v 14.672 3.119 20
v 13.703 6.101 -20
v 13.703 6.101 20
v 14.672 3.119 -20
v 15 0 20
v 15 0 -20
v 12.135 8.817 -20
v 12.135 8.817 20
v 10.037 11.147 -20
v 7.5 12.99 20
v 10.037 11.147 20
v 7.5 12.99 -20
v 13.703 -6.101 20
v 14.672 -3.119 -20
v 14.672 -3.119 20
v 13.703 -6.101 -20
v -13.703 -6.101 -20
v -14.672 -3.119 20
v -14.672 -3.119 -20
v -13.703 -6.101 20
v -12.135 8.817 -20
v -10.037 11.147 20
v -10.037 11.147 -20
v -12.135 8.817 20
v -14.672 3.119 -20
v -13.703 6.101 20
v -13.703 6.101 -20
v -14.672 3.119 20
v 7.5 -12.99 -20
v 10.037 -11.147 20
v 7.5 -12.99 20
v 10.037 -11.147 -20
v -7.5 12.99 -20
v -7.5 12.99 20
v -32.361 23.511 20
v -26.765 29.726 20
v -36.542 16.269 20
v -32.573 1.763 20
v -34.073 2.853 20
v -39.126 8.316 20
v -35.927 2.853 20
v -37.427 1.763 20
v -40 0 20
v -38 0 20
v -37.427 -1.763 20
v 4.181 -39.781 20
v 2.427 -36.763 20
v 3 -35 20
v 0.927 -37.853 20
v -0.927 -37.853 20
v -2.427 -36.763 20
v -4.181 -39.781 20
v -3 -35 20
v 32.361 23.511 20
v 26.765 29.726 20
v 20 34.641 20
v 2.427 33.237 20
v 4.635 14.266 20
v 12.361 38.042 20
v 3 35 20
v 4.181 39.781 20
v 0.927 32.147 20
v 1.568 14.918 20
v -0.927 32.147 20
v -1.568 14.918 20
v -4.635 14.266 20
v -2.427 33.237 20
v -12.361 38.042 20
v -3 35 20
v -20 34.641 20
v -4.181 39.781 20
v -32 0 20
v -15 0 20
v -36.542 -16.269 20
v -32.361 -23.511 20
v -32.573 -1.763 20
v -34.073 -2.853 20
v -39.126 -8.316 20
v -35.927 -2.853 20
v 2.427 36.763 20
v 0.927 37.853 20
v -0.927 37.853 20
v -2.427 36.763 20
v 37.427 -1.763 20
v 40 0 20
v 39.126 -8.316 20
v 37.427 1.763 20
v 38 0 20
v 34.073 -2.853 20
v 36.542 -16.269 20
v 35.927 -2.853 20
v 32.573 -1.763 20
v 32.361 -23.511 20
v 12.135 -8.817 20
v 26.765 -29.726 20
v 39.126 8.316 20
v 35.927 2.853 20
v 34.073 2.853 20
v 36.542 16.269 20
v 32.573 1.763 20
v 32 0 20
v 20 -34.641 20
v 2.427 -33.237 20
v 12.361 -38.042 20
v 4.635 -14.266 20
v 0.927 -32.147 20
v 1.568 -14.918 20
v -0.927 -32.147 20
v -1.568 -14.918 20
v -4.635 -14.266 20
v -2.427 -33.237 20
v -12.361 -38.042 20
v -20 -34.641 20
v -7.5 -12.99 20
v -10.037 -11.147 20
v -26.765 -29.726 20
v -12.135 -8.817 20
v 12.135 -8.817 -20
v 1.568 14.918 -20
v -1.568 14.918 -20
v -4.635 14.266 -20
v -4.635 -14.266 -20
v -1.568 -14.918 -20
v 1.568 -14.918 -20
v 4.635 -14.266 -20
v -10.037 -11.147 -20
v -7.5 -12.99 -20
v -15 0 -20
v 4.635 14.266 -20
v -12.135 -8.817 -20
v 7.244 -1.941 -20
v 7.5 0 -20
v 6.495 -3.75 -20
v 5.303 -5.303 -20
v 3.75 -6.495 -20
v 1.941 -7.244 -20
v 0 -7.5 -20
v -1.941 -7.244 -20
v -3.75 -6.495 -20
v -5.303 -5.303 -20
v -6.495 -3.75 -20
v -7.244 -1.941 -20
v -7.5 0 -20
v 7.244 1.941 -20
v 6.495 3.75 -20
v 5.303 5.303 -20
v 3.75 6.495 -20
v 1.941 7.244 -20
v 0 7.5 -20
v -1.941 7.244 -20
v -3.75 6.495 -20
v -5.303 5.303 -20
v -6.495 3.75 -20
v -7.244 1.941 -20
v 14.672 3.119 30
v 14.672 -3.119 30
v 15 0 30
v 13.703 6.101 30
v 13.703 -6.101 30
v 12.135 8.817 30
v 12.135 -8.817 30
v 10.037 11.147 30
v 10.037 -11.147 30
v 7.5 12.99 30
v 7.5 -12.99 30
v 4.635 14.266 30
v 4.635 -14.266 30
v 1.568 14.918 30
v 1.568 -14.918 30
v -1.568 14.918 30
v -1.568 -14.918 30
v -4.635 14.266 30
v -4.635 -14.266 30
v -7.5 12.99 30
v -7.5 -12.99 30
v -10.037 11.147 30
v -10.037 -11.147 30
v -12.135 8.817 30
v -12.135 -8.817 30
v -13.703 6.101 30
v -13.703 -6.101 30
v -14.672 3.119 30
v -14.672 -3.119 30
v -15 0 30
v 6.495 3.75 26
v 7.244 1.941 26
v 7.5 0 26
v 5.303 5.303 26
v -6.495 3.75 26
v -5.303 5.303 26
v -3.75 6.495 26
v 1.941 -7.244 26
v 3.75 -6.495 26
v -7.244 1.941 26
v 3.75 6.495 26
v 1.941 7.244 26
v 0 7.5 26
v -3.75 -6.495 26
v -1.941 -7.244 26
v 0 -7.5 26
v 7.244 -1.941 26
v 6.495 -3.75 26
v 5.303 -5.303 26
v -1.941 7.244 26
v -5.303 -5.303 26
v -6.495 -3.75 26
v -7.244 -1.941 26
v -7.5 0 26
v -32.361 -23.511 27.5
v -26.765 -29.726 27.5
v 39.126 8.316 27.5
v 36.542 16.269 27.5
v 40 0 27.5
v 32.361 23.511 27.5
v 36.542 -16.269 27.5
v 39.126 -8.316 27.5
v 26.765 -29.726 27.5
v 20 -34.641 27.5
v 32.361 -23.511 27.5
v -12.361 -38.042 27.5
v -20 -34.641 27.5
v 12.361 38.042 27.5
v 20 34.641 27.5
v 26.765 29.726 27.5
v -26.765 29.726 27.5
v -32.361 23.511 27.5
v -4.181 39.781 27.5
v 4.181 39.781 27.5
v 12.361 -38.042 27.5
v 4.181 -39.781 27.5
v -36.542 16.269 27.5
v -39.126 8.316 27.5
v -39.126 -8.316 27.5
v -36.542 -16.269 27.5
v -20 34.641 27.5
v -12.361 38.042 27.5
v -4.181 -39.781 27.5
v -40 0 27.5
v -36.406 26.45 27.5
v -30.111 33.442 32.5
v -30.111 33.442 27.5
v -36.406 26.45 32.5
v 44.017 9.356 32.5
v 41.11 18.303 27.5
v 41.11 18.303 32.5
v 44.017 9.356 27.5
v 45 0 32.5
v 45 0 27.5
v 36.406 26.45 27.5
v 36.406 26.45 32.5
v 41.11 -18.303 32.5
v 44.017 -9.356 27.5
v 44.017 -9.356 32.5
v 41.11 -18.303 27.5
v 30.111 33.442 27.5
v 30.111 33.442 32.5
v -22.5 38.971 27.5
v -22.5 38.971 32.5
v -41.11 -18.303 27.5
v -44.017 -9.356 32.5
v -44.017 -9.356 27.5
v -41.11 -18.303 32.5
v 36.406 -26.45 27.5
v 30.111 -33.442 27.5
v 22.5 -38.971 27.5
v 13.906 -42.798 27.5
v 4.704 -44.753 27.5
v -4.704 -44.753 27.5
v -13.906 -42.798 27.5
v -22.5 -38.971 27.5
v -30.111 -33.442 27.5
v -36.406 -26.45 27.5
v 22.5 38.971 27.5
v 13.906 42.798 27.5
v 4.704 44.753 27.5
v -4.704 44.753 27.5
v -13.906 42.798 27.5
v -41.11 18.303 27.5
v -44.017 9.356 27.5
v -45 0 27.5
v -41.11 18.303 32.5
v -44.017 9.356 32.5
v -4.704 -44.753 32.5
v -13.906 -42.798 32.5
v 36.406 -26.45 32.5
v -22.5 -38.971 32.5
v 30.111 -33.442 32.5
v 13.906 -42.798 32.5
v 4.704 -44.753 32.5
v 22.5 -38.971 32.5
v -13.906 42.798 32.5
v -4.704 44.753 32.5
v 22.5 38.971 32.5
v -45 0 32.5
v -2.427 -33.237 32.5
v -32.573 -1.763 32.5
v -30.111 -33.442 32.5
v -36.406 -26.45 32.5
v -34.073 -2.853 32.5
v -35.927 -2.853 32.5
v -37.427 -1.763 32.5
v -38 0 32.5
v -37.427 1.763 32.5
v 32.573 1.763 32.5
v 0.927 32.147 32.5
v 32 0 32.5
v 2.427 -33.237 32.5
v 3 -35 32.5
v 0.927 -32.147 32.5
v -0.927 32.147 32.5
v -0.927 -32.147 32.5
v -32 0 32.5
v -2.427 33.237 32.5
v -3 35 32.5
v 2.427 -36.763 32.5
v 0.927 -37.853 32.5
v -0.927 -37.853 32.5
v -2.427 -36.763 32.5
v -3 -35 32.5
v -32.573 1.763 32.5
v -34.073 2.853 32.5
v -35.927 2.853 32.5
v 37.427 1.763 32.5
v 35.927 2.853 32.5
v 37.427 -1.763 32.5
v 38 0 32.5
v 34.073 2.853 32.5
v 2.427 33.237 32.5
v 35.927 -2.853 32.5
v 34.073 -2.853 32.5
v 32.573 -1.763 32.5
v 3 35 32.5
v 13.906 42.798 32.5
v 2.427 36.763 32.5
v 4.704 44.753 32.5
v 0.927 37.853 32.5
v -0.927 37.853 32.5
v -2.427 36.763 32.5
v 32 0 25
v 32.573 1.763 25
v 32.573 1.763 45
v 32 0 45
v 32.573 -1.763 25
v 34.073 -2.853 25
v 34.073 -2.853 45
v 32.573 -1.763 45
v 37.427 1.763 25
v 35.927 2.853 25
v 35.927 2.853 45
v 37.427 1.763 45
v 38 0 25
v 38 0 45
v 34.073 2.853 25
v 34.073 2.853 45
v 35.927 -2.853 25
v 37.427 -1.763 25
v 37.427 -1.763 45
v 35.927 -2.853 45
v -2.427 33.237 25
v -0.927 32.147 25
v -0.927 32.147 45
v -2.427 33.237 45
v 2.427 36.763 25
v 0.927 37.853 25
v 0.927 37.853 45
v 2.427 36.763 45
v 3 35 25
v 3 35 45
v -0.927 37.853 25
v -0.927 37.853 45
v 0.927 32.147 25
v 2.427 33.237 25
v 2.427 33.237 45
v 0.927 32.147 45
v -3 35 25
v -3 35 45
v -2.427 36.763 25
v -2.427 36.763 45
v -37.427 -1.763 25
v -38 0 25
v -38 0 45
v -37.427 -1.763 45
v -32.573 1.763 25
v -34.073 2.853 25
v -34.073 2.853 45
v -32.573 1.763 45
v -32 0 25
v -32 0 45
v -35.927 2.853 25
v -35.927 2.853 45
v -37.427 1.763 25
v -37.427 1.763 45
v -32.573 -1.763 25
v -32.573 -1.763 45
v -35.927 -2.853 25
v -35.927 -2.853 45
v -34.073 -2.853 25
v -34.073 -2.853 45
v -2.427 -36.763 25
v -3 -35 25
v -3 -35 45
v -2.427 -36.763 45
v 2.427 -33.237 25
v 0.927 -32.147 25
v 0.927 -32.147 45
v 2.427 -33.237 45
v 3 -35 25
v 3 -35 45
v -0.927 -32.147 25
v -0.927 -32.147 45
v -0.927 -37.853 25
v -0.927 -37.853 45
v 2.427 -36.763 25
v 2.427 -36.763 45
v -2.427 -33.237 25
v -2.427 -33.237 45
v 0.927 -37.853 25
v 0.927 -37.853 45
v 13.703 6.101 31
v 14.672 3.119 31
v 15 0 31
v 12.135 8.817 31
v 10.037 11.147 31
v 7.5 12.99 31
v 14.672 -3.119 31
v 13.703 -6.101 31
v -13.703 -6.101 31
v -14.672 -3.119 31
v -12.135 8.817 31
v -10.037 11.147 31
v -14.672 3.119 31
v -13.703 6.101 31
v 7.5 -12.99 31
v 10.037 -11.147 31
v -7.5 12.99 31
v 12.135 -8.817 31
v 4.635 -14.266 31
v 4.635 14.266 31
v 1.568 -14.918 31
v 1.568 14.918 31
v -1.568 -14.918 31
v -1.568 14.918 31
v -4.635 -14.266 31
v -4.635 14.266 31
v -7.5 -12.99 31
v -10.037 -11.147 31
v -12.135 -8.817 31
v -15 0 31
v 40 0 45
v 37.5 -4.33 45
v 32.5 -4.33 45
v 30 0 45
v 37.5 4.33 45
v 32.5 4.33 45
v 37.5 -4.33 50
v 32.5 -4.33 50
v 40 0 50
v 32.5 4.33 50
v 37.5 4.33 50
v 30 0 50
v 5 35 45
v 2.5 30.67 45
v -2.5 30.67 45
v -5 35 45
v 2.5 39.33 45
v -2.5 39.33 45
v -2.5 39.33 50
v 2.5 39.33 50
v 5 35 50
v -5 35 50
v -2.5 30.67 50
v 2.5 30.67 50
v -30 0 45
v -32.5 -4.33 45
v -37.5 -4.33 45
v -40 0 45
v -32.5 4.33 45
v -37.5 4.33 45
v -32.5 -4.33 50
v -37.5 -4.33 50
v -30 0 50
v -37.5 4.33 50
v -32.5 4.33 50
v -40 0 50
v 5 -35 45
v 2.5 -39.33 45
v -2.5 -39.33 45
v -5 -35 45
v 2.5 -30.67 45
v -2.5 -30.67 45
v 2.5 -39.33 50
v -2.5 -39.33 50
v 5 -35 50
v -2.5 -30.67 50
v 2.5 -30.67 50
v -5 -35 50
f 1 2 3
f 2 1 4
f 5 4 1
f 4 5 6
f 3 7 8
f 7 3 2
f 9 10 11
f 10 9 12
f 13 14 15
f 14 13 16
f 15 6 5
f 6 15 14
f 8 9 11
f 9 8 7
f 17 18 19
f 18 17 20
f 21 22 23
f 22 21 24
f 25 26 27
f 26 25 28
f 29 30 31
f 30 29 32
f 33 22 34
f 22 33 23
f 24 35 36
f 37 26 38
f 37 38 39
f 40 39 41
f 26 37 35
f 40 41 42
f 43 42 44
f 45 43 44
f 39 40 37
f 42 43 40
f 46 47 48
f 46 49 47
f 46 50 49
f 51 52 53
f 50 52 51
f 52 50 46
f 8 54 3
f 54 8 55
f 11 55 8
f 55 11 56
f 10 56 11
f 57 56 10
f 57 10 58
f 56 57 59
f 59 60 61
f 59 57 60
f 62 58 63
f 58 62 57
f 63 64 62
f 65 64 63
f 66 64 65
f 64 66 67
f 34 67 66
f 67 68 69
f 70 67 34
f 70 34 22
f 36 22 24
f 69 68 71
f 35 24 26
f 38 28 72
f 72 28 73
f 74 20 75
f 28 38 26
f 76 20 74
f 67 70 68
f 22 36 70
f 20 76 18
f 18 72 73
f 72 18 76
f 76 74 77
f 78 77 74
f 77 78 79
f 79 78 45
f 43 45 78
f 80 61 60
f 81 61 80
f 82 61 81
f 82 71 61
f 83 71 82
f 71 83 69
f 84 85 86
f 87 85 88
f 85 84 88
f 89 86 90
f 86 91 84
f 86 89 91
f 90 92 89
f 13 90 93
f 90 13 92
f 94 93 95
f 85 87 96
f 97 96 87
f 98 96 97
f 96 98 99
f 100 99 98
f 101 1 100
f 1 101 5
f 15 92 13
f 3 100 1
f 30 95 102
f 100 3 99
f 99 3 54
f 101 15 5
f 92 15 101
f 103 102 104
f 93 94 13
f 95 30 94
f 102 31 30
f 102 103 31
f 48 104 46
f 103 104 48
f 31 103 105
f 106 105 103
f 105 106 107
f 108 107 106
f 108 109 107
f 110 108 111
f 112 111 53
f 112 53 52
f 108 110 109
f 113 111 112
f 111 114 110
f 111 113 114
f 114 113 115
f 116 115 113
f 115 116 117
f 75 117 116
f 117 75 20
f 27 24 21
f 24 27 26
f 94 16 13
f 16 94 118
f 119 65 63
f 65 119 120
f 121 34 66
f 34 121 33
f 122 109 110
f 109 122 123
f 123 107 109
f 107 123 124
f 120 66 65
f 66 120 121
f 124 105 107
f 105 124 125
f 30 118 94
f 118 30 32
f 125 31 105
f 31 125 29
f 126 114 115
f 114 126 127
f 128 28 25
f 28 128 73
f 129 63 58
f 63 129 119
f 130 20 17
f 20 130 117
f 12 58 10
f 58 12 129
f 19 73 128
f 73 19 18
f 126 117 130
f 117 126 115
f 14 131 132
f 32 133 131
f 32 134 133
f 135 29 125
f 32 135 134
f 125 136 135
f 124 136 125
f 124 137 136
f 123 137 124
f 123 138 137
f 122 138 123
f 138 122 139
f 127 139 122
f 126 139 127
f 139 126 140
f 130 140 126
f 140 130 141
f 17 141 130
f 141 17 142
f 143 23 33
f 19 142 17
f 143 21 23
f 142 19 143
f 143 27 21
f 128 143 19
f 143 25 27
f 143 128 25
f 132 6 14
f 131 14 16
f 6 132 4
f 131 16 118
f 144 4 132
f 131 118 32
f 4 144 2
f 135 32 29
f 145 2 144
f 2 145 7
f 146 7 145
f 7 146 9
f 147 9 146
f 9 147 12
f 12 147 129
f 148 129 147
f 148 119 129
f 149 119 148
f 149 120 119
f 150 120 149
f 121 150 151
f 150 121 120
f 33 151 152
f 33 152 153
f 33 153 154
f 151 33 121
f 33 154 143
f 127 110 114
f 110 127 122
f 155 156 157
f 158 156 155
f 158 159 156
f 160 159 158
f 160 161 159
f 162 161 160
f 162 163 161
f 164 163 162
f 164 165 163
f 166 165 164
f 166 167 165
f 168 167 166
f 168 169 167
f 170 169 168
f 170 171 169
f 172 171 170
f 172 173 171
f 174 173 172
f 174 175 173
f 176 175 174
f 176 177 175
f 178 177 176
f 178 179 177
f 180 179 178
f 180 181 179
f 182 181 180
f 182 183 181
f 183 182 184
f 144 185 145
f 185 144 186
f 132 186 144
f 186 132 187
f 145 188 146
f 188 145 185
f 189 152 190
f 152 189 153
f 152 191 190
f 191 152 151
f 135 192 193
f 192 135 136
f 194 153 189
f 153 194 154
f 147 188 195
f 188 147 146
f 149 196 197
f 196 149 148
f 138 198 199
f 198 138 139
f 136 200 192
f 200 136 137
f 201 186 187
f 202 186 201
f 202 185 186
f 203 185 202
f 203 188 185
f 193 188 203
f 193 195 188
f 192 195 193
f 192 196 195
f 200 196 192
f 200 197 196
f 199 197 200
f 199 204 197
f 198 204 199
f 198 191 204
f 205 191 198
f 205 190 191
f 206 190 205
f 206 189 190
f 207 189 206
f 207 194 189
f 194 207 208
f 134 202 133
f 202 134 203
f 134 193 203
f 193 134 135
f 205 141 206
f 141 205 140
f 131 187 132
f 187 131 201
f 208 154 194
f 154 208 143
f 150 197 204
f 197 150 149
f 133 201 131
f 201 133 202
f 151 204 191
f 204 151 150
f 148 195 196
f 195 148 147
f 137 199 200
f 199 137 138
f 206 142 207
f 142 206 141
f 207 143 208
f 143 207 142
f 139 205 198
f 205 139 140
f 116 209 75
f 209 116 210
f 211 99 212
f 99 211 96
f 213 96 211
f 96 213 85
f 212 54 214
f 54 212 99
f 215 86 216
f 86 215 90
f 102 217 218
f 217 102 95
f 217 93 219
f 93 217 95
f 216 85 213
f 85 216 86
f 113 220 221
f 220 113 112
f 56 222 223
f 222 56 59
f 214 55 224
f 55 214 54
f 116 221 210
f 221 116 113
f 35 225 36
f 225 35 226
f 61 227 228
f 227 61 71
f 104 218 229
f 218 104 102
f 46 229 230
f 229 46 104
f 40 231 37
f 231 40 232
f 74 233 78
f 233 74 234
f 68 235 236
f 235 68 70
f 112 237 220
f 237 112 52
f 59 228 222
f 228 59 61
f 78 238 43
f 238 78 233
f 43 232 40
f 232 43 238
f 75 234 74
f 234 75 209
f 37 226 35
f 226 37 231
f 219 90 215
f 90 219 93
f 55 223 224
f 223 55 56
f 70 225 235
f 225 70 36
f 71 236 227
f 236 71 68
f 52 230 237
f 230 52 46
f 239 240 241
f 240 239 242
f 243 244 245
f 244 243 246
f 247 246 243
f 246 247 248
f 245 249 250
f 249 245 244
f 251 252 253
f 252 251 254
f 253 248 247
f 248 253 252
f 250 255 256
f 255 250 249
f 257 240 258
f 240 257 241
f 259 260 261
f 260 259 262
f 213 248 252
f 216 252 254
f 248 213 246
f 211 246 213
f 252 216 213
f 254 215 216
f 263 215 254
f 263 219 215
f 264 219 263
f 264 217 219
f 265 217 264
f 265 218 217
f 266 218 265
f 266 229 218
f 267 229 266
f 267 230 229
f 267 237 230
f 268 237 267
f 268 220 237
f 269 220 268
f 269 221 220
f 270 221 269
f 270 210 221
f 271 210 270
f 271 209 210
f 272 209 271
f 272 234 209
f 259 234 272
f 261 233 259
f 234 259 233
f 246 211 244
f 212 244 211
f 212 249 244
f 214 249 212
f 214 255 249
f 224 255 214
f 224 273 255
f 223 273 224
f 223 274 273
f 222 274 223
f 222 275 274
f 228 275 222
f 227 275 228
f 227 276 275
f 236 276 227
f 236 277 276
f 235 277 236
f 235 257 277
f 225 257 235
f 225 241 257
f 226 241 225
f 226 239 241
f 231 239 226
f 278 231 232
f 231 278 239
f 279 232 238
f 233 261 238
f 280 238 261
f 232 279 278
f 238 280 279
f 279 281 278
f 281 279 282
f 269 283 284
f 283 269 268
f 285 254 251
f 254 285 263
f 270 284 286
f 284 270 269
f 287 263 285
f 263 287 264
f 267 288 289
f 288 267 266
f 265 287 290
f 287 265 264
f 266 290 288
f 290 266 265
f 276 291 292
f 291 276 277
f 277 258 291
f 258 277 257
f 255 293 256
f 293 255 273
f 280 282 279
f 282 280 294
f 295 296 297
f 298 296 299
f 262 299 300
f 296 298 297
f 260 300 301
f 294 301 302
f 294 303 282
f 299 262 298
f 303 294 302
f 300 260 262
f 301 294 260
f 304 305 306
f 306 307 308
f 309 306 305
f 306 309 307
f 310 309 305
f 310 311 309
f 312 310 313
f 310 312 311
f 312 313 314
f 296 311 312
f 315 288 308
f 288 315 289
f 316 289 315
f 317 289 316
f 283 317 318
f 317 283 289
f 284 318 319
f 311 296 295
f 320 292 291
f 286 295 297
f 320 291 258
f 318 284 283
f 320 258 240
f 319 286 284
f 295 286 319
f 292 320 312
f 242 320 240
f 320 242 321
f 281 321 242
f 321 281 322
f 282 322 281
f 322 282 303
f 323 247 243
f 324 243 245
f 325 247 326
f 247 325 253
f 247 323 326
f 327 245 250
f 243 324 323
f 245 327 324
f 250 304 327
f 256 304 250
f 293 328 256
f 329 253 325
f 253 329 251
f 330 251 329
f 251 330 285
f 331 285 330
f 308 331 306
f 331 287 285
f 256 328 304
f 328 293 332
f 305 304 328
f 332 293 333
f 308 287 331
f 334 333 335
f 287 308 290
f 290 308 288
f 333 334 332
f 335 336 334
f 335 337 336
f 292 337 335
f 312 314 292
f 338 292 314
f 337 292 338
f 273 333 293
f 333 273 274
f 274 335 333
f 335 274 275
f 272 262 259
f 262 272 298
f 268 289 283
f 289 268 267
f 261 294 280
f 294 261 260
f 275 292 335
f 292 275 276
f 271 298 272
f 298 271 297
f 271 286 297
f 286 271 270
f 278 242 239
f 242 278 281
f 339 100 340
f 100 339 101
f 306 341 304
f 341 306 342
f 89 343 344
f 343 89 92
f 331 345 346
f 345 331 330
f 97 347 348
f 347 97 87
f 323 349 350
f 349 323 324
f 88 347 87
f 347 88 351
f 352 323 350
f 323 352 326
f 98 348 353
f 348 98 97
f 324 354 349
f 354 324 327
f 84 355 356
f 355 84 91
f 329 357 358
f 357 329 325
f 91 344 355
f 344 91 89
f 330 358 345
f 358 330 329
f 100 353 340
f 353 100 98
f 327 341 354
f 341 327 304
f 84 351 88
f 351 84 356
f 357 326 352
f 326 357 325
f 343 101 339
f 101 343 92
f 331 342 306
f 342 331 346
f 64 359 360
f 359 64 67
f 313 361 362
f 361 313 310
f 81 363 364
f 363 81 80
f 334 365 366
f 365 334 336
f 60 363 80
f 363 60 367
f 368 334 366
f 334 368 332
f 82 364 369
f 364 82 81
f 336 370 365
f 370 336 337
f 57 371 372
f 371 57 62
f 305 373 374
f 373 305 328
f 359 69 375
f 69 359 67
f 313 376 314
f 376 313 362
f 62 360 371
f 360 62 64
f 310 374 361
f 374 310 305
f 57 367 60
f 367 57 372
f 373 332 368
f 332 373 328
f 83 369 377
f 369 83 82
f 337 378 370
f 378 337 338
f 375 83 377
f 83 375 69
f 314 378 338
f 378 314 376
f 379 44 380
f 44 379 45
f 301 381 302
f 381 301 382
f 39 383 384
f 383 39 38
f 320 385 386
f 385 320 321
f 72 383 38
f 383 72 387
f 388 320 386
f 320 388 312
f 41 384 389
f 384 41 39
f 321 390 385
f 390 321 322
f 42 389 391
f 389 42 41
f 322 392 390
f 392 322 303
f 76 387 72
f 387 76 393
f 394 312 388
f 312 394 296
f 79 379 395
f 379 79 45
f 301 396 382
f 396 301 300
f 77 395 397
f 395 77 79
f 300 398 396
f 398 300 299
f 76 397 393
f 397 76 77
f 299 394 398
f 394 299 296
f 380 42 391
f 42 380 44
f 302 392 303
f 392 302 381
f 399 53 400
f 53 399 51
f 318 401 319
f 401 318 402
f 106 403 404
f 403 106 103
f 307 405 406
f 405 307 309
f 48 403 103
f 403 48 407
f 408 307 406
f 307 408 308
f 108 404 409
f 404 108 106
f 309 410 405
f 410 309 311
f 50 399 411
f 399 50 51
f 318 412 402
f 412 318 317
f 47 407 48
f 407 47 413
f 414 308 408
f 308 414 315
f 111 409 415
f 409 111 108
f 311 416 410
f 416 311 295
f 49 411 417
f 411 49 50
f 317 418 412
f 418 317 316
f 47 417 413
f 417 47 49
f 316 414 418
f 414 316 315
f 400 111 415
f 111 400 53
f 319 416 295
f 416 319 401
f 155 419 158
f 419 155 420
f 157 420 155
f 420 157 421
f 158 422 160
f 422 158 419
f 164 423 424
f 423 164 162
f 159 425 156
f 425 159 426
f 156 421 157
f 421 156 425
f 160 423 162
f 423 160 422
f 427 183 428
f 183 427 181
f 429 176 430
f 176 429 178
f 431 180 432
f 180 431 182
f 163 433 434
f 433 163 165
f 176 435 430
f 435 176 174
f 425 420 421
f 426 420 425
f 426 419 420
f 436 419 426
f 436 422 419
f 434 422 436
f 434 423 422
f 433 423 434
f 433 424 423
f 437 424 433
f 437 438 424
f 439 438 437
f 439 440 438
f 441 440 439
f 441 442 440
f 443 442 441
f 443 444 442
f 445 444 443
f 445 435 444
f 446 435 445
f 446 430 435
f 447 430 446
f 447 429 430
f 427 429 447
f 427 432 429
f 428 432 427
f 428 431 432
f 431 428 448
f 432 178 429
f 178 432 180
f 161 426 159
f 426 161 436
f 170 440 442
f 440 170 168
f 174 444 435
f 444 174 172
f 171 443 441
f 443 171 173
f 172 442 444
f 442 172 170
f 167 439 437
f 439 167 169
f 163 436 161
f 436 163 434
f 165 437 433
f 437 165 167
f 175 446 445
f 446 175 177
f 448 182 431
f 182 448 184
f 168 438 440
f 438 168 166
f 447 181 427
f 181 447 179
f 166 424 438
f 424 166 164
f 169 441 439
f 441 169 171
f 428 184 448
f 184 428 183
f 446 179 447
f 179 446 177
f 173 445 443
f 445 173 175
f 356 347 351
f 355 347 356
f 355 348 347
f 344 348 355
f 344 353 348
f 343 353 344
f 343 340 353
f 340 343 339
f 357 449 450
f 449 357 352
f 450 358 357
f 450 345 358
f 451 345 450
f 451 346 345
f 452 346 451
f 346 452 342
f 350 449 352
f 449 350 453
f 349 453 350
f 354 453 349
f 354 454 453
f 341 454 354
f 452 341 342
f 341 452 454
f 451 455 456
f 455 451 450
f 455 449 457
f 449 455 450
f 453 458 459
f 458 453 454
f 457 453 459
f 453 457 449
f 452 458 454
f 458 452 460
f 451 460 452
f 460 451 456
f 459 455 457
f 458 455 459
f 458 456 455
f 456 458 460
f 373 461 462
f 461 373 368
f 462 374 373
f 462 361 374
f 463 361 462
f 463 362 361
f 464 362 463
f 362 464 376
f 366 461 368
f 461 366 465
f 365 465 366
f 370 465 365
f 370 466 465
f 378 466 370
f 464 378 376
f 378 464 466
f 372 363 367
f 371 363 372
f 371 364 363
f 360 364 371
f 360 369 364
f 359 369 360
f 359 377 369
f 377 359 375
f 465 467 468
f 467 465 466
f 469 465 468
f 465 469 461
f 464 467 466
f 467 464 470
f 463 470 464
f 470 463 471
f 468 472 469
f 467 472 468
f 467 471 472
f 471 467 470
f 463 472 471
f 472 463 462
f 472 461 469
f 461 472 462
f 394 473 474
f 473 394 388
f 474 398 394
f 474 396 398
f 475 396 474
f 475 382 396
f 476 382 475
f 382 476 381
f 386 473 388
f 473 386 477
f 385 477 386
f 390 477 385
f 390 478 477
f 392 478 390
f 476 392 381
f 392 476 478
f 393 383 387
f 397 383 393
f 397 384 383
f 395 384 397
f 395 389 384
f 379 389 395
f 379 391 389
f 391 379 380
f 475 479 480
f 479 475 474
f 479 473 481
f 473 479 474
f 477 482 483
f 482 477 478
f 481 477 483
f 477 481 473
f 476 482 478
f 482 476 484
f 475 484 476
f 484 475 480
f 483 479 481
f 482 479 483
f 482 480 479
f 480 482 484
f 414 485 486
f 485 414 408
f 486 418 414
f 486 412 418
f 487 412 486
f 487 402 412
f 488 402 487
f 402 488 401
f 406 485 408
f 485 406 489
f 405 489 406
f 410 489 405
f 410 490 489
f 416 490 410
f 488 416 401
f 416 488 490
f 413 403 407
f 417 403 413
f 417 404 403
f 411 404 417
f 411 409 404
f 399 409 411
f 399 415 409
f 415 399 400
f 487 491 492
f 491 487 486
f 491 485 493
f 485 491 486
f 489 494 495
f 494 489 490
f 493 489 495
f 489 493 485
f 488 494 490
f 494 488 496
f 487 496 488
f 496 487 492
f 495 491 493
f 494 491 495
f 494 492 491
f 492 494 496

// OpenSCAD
// Parameters
hub_diameter = 30;
hub_length = 40;
shaft_hole_diameter = 15;
flange_diameter = 80;
flange_thickness = 10;
bolt_hole_radius = 35;
bolt_diameter = 6;
bolt_length = 20;
nut_size = 10;
num_bolts = 4;
flange_rim_thickness = 5;
flange_rim_diameter = 90;
hub_extension_length = 10;
hub_extension_diameter = 40;

// Hub module with additional details
module hub() {
    difference() {
        union() {
            cylinder(d=hub_diameter, h=hub_length, center=true);
            translate([0, 0, hub_length/2])
                cylinder(d=hub_extension_diameter, h=hub_extension_length, center=false);
        }
        cylinder(d=shaft_hole_diameter, h=hub_length+hub_extension_length+2, center=true);
    }
}

// Flange module with raised rim
module flange() {
    difference() {
        union() {
            cylinder(d=flange_diameter, h=flange_thickness, center=true);
            translate([0, 0, flange_thickness/2])
                cylinder(d=flange_rim_diameter, h=flange_rim_thickness, center=true);
        }
        cylinder(d=hub_diameter, h=flange_thickness+2, center=true);
        for (i = [0:num_bolts-1]) {
            angle = i * 360 / num_bolts;
            translate([bolt_hole_radius * cos(angle), bolt_hole_radius * sin(angle), 0])
                cylinder(d=bolt_diameter, h=flange_thickness+2, center=true);
        }
    }
}

// Bolt module properly aligned
module bolt() {
    cylinder(d=bolt_diameter, h=bolt_length, center=false);
}

// Nut module properly positioned
module nut() {
    cylinder(d=nut_size, h=5, $fn=6, center=false);
}

// Assemble the components
module assembly() {
    hub();
    translate([0, 0, hub_length/2 + flange_thickness/2]) flange();
    for (i = [0:num_bolts-1]) {
        angle = i * 360 / num_bolts;
        translate([bolt_hole_radius * cos(angle), bolt_hole_radius * sin(angle), hub_length/2 + flange_thickness/2])
            bolt();
        translate([bolt_hole_radius * cos(angle), bolt_hole_radius * sin(angle), hub_length/2 + flange_thickness/2 + bolt_length])
            nut();
    }
}

// Render the assembly
assembly();
